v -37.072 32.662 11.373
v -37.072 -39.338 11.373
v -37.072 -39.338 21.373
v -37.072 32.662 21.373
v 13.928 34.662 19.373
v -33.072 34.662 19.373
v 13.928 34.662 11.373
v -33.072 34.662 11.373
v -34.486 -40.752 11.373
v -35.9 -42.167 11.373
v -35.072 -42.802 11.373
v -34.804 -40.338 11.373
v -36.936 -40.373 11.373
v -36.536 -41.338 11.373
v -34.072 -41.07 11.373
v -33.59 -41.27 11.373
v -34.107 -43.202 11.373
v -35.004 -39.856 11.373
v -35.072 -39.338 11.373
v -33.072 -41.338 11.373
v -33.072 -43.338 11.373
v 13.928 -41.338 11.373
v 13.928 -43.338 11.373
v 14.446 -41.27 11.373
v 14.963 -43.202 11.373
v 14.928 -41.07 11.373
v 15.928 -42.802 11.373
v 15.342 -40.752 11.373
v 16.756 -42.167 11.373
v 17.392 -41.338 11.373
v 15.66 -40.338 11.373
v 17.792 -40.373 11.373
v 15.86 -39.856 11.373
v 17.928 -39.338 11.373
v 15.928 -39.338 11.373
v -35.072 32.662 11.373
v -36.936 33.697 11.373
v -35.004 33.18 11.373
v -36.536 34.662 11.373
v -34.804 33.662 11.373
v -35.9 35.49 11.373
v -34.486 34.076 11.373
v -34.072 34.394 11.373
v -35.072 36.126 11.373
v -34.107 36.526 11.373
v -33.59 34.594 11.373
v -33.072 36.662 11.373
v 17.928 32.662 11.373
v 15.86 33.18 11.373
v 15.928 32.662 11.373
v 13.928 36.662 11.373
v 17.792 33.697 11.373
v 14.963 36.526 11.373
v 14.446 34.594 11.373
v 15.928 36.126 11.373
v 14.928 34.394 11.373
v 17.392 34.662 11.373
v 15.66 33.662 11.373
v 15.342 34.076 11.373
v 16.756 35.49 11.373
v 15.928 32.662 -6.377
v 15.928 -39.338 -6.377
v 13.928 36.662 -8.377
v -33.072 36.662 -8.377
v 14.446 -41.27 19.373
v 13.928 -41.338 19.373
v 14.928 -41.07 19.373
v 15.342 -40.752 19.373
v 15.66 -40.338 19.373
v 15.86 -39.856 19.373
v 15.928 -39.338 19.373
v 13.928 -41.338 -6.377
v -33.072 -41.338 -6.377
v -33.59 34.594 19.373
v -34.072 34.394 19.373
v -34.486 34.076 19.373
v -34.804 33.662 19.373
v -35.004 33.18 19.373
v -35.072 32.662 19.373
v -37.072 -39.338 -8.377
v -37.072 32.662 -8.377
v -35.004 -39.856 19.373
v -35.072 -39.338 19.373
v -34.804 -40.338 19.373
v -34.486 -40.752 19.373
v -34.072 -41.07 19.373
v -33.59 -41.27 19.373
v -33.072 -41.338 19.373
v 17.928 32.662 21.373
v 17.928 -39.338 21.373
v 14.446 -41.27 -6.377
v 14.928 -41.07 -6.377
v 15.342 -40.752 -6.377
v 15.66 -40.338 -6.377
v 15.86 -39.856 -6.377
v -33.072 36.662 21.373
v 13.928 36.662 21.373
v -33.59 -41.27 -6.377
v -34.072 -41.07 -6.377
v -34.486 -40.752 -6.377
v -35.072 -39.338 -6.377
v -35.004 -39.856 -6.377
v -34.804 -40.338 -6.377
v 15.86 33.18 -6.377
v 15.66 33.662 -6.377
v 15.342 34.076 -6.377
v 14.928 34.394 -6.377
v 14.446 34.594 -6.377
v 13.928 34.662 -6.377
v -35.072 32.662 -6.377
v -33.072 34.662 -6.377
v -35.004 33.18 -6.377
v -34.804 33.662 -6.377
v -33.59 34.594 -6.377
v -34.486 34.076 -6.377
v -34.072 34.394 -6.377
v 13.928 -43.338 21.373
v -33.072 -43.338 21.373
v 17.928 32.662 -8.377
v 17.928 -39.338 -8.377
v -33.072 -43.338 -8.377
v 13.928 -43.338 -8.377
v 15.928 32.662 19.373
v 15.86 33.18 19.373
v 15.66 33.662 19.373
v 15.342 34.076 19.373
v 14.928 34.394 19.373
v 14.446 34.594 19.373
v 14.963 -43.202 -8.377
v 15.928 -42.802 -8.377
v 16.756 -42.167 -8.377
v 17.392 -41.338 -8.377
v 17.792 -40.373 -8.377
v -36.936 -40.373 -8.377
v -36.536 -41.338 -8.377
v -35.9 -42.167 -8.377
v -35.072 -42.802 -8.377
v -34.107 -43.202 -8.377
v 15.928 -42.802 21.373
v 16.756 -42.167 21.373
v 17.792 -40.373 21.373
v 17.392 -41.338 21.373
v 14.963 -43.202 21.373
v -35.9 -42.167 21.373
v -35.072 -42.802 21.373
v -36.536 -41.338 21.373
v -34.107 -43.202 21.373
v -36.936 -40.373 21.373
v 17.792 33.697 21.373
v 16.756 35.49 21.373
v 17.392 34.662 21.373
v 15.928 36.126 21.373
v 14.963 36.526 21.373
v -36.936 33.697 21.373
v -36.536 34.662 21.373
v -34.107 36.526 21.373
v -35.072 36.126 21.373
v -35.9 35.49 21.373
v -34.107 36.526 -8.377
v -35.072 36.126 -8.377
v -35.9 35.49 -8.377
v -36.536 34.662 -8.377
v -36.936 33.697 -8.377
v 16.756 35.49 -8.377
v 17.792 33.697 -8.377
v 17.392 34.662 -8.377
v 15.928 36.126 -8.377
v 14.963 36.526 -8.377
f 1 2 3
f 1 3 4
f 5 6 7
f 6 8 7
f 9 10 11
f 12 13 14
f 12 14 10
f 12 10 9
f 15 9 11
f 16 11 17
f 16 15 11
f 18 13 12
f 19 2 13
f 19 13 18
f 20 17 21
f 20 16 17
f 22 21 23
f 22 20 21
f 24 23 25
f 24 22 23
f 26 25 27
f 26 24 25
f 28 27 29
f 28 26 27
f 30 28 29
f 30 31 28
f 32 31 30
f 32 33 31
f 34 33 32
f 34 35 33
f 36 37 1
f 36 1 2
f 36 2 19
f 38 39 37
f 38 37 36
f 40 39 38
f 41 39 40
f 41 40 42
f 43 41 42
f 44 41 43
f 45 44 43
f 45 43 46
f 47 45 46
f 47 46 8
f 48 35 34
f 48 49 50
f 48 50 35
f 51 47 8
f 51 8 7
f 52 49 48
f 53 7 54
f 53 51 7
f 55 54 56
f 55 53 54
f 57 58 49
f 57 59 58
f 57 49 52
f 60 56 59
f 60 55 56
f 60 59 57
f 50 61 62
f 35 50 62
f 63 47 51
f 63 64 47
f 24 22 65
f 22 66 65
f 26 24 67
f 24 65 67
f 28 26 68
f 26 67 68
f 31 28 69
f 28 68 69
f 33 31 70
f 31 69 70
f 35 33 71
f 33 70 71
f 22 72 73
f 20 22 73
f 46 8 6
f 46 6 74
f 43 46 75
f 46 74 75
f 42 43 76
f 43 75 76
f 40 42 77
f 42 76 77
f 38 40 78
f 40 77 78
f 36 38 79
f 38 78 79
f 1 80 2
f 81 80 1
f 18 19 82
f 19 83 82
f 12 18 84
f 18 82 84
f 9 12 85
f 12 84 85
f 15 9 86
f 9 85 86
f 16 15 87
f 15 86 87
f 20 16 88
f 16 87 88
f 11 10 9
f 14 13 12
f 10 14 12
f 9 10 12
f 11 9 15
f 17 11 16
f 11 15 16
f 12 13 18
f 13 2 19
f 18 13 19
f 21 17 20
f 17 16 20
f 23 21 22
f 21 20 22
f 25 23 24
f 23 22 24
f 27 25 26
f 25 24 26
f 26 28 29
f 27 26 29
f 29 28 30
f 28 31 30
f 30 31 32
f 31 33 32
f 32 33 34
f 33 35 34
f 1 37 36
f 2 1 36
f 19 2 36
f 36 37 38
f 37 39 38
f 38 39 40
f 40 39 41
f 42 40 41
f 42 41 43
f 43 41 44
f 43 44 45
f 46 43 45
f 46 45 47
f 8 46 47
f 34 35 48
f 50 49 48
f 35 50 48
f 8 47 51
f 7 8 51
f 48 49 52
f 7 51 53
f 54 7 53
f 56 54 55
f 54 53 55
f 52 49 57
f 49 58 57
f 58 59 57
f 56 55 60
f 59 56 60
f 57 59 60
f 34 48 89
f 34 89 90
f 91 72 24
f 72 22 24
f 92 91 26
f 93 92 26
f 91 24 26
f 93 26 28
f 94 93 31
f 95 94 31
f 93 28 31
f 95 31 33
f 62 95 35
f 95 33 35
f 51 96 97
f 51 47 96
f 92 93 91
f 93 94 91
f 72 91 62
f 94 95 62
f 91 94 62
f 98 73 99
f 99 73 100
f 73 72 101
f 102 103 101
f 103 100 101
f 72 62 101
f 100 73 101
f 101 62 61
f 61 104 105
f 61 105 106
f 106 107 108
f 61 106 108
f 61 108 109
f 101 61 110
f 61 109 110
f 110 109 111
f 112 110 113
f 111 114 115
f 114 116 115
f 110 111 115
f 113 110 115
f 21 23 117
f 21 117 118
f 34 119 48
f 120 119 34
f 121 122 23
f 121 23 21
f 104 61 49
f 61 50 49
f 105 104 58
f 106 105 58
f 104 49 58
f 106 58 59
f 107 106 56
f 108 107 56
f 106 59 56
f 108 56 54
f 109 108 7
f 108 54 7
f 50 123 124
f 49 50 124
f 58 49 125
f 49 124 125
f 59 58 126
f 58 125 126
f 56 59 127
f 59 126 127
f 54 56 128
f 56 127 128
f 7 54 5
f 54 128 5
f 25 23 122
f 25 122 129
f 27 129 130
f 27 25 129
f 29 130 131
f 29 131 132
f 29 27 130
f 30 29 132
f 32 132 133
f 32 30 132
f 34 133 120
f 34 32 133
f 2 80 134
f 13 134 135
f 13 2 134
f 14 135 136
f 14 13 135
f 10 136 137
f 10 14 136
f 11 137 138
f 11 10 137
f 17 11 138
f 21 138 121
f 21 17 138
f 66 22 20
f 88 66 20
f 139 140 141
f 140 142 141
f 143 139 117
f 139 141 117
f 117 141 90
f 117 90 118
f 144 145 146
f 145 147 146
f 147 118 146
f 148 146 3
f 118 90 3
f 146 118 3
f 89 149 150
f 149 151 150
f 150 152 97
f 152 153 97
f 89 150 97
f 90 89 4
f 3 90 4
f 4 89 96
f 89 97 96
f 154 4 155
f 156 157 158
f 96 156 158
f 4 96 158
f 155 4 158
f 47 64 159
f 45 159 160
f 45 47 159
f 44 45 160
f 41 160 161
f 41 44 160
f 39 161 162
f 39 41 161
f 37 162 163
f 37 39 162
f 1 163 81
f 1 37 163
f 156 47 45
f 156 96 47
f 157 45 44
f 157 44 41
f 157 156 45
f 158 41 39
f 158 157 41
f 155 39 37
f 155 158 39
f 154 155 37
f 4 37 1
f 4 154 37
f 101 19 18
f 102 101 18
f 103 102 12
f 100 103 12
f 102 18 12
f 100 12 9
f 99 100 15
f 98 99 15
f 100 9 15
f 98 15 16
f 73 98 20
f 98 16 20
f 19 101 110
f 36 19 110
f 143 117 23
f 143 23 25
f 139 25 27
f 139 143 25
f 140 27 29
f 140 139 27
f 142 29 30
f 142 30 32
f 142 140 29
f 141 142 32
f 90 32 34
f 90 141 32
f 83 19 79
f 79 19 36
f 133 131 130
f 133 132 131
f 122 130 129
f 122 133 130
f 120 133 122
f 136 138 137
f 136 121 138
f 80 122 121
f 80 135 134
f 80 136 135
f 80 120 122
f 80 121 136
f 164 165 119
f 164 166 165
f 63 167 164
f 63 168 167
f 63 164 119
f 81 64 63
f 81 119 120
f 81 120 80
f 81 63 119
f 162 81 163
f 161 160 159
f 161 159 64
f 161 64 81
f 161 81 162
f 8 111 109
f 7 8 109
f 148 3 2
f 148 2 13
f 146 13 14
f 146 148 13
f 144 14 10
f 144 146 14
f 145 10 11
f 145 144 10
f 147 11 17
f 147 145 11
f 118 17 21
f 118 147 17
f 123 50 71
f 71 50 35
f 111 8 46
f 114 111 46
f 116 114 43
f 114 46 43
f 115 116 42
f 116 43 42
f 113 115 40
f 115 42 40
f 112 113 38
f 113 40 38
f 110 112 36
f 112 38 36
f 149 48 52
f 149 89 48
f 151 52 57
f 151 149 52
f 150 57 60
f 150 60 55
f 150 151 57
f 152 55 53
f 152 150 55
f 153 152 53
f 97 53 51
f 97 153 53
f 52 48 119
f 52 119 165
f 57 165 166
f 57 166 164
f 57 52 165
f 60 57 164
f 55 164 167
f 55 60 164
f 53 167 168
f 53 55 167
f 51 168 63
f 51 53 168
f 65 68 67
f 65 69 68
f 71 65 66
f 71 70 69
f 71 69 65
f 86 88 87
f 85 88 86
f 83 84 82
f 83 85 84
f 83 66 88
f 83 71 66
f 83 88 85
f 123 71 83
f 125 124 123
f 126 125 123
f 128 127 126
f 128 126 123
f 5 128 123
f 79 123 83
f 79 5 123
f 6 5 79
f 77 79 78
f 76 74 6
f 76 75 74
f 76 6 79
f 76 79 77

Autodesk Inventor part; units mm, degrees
ref_plane "YZ Plane" through (0, 0, 0) normal (1, 0, 0) x (0, 1, 0)
ref_plane "XZ Plane" through (0, 0, 0) normal (0, 1, 0) x (-1, 0, 0)
ref_plane "Work Plane3" through (-33.721, -16.0631, -8.3772) normal (0, 0, -1) x (-1, 0, 0)
sketch "Sketch2" plane through (-33.721, -16.0631, -8.3772) normal (0, 0, -1) x (-1, 0, 0)
  line L0 (3.351, 52.725) -> (-51.649, 52.725)
  line L1 (-51.649, 52.725) -> (-51.649, -27.275)
  line L2 (-51.649, -27.275) -> (3.351, -27.275)
  line L3 (3.351, -27.275) -> (3.351, 52.725)
  line L4 (3.351, 52.725) -> (-51.649, -27.275) construction
  line L5 (-51.649, 52.725) -> (3.351, -27.275) construction
  line L6 (-25.524, -24.775) -> (-3.524, -24.775) projected
  line L7 (-0.024, 32.975) -> (-0.024, 14.6) projected
  line L8 (-48.274, -10.275) -> (-48.274, 32.975) projected
  line L9 (-3.524, 50.225) -> (-25.524, 50.225) projected
  point P0 (-33.721, 16.0631)
  point P1 (-24.149, 12.725)
  dimension "d2" = 55
  dimension "d3" = 80
  dimension "d4" = 2.5
  dimension "d5" = 3.375
  dimension "d6" = 3.375
  dimension "d7" = 2.5
ref_plane "Work Plane4" through (-28.697, -42.3381, 21.3728) normal (0, 0, 1) x (1, 0, 0)
extrude "Extrusion1" add sketch "Sketch2" against normal up to surface (29.75 mm away)
fillet "Fillet1" radius 4 4 edges at (-37.072, -43.3381, 6.4978) (17.928, -43.3381, 6.4978) (17.928, 36.6619, 6.4978) (-37.072, 36.6619, 6.4978)
shell "Shell1" thickness 2 removed faces 0
ref_plane "Work Plane5" through (-8.197, -40.8381, 11.3728) normal (0, 0, 1) x (1, 0, 0)
split body "Split1" result two bodies by plane through (-8.197, -40.8381, 11.3728) normal (0, 0, 1) first body at (-18.7387, 8.6619, 20.8728)
equation "\"d6\" = d5"
equation "\"d7\" = d4"
properties part number "bottom"
